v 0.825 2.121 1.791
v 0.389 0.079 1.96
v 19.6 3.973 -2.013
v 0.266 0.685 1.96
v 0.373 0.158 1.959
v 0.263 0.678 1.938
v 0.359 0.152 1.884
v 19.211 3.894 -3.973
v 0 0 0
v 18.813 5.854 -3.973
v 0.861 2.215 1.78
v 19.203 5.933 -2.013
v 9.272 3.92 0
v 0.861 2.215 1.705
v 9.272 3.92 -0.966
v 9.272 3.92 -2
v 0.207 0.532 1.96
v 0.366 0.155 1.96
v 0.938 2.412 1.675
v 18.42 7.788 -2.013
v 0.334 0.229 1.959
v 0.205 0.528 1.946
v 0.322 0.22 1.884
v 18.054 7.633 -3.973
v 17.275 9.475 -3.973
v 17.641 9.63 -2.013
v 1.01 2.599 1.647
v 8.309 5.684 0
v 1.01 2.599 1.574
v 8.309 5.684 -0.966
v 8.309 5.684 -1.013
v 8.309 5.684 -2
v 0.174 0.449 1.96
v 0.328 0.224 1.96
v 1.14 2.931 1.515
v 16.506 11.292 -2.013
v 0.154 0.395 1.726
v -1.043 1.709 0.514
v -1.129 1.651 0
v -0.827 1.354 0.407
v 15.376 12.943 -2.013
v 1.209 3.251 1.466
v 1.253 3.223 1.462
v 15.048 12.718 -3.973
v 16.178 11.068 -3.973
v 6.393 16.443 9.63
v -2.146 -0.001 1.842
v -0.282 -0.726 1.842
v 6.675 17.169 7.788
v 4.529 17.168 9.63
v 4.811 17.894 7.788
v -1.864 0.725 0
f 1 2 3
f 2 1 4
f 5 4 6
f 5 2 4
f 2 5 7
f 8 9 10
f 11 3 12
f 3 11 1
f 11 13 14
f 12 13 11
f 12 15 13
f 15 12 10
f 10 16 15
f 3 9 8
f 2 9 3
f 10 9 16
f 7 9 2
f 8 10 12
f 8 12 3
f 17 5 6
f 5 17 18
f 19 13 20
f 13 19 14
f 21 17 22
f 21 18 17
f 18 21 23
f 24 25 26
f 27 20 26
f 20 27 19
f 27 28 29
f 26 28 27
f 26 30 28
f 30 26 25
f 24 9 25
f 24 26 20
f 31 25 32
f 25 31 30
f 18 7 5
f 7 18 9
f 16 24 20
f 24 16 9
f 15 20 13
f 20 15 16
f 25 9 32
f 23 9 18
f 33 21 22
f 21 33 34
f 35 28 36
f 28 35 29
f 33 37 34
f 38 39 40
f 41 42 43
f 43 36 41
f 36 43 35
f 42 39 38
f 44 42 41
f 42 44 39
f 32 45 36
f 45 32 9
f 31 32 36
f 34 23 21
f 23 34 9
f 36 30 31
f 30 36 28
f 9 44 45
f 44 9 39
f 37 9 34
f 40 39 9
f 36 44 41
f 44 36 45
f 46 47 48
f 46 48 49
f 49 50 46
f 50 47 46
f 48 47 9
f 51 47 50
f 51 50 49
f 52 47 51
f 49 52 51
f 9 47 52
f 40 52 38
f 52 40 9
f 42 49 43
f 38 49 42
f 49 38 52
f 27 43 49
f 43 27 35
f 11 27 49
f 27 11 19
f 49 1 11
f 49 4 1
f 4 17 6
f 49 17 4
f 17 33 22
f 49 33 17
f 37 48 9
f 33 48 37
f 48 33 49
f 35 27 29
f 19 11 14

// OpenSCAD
// We'll use celestial notation. All angles are in degrees.
test_aas = [ [0.1, 0.1], [0.1,0.2], [0.1,0.3], [-0.2,0.6] ];
RAD=360.0/PI;

module make_legs( alt_azims ) {
    for ( aa = alt_azims ) {
        alt = aa[0];
        azim = aa[1];
        rotate( a = [0, alt*RAD, azim*RAD]) children();
    }
}

make_legs( test_aas ) cube(size=[20,2,2]);
